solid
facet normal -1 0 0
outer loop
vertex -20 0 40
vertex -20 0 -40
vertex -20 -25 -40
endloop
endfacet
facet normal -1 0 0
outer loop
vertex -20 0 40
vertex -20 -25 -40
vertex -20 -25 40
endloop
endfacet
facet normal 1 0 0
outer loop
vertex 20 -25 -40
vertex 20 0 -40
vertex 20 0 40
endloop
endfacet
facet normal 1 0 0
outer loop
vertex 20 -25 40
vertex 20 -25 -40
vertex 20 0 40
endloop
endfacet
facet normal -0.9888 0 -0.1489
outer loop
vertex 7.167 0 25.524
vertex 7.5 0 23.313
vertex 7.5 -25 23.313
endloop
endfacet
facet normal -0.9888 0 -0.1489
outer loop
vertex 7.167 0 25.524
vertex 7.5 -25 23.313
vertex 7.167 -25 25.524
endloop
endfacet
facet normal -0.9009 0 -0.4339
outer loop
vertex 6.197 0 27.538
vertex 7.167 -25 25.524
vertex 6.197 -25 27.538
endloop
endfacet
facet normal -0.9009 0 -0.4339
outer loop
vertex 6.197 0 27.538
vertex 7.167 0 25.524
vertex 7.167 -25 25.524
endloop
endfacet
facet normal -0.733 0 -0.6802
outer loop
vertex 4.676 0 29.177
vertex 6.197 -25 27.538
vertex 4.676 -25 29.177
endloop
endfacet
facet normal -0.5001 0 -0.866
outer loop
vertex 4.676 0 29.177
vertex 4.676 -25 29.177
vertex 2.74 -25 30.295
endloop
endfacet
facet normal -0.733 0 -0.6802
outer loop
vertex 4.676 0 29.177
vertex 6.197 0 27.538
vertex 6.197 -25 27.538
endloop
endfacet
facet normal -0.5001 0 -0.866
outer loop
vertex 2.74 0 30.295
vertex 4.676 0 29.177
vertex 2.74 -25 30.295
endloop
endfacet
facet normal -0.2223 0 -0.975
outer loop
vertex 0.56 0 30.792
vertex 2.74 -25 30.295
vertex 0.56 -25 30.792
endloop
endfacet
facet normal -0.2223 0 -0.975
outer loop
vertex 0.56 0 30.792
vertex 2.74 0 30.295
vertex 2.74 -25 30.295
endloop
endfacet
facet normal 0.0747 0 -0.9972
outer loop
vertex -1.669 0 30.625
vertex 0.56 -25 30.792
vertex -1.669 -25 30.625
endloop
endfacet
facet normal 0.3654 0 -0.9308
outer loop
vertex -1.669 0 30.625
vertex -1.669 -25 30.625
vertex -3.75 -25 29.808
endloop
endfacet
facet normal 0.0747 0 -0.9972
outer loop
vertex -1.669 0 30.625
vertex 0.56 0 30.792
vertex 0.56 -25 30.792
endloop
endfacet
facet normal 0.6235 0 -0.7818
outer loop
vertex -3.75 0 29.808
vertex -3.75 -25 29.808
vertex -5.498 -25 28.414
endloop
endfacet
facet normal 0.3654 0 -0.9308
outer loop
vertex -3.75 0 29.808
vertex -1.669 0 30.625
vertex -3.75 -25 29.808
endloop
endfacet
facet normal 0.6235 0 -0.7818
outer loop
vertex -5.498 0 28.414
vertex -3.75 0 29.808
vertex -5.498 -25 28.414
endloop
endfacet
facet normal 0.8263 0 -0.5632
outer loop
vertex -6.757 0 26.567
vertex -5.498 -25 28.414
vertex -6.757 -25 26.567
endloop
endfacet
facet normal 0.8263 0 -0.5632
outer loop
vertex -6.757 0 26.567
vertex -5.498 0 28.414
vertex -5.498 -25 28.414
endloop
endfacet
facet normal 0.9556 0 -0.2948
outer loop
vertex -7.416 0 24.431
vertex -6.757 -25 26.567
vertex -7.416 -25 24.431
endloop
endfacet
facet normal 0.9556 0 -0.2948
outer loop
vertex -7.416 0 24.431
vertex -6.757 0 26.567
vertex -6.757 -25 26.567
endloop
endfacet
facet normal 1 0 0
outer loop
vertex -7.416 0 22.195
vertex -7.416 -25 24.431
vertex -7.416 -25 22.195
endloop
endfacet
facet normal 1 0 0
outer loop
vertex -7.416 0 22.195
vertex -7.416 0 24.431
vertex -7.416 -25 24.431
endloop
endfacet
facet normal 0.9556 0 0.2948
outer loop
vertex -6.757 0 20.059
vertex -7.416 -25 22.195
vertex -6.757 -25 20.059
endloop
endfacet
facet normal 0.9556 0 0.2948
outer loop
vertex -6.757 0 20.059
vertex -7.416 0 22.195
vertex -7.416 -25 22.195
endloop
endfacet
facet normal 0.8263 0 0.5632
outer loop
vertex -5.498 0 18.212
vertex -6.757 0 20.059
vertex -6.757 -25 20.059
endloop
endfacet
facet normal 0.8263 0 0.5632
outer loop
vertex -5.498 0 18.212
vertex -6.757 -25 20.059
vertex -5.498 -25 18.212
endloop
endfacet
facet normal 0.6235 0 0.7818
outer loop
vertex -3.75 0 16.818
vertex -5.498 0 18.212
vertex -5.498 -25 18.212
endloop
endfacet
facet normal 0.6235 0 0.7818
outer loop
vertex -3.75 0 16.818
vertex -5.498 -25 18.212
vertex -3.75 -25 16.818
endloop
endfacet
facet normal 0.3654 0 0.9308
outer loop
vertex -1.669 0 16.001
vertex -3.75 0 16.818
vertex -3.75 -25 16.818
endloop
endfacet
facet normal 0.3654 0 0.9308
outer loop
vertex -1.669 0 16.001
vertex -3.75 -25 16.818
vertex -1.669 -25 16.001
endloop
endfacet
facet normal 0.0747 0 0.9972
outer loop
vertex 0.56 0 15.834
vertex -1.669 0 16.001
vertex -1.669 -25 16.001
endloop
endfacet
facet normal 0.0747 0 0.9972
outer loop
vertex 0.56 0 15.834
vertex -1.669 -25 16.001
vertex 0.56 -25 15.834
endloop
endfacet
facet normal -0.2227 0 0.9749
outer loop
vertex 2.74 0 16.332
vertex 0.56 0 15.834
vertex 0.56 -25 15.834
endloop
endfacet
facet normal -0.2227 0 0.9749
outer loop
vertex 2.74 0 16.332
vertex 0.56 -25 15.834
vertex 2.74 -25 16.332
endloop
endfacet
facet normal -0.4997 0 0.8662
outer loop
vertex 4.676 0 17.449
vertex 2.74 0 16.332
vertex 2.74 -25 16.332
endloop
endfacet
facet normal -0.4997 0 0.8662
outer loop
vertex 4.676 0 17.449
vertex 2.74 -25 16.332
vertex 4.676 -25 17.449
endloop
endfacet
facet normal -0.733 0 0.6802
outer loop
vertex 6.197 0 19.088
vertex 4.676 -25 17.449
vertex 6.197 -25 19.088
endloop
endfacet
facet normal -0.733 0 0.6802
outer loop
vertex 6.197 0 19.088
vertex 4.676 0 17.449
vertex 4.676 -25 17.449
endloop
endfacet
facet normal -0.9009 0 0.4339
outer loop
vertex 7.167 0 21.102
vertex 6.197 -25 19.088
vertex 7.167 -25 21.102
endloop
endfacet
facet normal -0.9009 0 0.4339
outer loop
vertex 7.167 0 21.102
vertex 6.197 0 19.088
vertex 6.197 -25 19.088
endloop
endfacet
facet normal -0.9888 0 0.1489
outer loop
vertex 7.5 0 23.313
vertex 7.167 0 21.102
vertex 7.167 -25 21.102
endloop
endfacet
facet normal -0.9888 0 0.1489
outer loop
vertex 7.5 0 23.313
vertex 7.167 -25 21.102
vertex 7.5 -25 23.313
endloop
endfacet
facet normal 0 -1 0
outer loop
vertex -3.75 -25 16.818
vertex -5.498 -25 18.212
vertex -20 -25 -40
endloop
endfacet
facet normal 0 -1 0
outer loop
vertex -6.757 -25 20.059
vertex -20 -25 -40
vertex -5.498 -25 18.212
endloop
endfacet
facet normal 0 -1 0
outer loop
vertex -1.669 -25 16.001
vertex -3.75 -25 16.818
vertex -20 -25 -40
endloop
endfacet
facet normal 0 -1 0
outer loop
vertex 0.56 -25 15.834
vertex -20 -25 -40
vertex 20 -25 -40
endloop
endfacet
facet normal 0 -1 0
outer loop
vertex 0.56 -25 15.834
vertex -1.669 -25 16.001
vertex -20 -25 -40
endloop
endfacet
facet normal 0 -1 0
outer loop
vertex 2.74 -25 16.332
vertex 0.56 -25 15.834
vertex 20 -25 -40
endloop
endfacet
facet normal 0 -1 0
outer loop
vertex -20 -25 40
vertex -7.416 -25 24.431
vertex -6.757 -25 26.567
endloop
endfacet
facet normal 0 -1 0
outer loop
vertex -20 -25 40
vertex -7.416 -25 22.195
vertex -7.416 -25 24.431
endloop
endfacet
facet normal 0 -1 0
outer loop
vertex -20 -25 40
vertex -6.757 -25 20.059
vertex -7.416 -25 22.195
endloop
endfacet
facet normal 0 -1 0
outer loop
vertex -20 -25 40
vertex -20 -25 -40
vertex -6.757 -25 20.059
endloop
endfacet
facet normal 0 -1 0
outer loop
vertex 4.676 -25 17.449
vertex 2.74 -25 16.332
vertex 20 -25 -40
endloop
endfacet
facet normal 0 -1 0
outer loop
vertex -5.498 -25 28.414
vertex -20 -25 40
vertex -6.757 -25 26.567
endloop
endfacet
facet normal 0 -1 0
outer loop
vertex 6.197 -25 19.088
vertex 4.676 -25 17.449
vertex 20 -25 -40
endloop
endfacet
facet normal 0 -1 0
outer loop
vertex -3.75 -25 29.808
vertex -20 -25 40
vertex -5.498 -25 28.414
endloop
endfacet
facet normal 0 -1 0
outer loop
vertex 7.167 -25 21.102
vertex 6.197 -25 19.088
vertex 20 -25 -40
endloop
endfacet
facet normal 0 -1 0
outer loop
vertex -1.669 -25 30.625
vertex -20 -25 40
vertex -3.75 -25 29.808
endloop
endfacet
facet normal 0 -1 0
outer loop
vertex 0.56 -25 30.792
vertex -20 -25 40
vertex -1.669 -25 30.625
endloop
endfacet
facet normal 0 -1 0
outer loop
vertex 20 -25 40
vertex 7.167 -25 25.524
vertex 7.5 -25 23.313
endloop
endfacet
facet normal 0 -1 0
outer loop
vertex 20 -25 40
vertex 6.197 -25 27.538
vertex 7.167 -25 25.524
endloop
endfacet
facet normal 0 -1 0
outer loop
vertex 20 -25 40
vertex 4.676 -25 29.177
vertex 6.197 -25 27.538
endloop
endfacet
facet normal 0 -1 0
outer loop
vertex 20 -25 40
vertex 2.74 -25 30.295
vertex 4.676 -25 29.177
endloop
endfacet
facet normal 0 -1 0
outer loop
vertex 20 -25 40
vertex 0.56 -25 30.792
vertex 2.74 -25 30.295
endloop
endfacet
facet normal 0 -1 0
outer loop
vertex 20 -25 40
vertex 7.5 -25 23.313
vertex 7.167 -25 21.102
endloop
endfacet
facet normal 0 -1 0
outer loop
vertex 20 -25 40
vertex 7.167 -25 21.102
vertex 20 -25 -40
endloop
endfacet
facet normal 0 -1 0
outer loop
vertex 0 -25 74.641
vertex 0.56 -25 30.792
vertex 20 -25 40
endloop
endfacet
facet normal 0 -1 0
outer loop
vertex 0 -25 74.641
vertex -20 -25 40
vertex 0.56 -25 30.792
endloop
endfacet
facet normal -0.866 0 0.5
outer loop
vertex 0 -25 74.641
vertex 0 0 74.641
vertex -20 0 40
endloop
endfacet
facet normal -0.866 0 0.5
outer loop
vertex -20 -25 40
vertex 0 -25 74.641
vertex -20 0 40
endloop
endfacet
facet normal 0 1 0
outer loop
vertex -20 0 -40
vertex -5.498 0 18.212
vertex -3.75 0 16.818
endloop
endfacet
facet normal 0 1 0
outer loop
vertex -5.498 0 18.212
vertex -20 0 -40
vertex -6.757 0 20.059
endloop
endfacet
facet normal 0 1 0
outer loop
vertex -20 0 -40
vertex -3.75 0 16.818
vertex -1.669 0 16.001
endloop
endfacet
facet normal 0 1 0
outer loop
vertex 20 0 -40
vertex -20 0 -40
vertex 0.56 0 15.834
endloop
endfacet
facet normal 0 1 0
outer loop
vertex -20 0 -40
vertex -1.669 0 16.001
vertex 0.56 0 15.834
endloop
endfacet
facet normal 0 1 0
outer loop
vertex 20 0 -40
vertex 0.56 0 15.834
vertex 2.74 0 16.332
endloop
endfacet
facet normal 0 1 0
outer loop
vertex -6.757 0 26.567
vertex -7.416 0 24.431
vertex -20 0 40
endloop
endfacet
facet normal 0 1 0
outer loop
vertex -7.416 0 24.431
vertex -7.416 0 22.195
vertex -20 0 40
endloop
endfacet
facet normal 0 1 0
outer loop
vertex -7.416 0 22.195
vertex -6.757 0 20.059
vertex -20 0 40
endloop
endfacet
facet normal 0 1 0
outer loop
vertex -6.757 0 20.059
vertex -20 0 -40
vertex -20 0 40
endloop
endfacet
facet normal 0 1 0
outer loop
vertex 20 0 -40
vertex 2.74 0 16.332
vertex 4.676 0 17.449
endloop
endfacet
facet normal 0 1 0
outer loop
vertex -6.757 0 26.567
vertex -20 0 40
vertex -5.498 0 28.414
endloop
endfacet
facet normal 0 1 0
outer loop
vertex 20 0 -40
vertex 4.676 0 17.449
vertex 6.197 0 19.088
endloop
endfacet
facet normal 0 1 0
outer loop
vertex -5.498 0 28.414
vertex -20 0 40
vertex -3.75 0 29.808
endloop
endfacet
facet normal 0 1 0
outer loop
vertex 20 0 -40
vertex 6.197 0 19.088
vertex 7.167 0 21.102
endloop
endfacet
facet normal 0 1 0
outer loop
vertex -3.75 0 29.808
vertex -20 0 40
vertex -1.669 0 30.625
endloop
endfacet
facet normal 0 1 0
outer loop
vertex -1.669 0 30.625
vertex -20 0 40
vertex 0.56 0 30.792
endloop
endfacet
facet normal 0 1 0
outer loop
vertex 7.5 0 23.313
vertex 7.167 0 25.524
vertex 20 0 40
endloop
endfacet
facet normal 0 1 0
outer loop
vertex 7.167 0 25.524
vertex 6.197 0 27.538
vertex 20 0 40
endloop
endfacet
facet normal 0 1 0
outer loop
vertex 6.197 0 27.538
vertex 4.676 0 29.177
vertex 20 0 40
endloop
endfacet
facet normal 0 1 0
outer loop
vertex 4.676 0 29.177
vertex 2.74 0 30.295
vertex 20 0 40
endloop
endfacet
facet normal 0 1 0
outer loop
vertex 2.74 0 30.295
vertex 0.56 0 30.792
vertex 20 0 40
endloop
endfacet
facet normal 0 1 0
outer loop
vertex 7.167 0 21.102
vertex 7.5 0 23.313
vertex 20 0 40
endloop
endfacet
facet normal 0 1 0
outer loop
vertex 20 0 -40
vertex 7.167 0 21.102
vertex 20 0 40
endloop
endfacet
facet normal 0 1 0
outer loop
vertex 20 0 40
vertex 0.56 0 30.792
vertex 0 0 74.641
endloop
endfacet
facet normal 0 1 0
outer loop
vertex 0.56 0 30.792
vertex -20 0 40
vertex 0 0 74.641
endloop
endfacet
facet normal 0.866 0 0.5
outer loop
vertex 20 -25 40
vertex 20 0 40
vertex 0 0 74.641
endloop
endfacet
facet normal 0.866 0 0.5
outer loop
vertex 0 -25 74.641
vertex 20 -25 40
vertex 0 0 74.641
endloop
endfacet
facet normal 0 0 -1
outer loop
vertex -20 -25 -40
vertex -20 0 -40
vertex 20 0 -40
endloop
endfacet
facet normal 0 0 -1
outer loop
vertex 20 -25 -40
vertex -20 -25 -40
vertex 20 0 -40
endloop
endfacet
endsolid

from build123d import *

# Parameters (mm, degrees)
F0_W     = 40
F0_H     = 80
F0_R     = 7.5
F1_DEPTH = 25


with BuildPart() as f1:
    # F0 (on Front) → F1 (new body)
    with BuildSketch(Plane.XZ):
        Rectangle(F0_W, F0_H)
        with Locations((0, 23.313124)):
            Circle(F0_R, mode=Mode.SUBTRACT)
        Polygon((-20, 40), (20, 40), (0, 74.641016), align=None)
    extrude(amount=F1_DEPTH)


solid = f1.part
